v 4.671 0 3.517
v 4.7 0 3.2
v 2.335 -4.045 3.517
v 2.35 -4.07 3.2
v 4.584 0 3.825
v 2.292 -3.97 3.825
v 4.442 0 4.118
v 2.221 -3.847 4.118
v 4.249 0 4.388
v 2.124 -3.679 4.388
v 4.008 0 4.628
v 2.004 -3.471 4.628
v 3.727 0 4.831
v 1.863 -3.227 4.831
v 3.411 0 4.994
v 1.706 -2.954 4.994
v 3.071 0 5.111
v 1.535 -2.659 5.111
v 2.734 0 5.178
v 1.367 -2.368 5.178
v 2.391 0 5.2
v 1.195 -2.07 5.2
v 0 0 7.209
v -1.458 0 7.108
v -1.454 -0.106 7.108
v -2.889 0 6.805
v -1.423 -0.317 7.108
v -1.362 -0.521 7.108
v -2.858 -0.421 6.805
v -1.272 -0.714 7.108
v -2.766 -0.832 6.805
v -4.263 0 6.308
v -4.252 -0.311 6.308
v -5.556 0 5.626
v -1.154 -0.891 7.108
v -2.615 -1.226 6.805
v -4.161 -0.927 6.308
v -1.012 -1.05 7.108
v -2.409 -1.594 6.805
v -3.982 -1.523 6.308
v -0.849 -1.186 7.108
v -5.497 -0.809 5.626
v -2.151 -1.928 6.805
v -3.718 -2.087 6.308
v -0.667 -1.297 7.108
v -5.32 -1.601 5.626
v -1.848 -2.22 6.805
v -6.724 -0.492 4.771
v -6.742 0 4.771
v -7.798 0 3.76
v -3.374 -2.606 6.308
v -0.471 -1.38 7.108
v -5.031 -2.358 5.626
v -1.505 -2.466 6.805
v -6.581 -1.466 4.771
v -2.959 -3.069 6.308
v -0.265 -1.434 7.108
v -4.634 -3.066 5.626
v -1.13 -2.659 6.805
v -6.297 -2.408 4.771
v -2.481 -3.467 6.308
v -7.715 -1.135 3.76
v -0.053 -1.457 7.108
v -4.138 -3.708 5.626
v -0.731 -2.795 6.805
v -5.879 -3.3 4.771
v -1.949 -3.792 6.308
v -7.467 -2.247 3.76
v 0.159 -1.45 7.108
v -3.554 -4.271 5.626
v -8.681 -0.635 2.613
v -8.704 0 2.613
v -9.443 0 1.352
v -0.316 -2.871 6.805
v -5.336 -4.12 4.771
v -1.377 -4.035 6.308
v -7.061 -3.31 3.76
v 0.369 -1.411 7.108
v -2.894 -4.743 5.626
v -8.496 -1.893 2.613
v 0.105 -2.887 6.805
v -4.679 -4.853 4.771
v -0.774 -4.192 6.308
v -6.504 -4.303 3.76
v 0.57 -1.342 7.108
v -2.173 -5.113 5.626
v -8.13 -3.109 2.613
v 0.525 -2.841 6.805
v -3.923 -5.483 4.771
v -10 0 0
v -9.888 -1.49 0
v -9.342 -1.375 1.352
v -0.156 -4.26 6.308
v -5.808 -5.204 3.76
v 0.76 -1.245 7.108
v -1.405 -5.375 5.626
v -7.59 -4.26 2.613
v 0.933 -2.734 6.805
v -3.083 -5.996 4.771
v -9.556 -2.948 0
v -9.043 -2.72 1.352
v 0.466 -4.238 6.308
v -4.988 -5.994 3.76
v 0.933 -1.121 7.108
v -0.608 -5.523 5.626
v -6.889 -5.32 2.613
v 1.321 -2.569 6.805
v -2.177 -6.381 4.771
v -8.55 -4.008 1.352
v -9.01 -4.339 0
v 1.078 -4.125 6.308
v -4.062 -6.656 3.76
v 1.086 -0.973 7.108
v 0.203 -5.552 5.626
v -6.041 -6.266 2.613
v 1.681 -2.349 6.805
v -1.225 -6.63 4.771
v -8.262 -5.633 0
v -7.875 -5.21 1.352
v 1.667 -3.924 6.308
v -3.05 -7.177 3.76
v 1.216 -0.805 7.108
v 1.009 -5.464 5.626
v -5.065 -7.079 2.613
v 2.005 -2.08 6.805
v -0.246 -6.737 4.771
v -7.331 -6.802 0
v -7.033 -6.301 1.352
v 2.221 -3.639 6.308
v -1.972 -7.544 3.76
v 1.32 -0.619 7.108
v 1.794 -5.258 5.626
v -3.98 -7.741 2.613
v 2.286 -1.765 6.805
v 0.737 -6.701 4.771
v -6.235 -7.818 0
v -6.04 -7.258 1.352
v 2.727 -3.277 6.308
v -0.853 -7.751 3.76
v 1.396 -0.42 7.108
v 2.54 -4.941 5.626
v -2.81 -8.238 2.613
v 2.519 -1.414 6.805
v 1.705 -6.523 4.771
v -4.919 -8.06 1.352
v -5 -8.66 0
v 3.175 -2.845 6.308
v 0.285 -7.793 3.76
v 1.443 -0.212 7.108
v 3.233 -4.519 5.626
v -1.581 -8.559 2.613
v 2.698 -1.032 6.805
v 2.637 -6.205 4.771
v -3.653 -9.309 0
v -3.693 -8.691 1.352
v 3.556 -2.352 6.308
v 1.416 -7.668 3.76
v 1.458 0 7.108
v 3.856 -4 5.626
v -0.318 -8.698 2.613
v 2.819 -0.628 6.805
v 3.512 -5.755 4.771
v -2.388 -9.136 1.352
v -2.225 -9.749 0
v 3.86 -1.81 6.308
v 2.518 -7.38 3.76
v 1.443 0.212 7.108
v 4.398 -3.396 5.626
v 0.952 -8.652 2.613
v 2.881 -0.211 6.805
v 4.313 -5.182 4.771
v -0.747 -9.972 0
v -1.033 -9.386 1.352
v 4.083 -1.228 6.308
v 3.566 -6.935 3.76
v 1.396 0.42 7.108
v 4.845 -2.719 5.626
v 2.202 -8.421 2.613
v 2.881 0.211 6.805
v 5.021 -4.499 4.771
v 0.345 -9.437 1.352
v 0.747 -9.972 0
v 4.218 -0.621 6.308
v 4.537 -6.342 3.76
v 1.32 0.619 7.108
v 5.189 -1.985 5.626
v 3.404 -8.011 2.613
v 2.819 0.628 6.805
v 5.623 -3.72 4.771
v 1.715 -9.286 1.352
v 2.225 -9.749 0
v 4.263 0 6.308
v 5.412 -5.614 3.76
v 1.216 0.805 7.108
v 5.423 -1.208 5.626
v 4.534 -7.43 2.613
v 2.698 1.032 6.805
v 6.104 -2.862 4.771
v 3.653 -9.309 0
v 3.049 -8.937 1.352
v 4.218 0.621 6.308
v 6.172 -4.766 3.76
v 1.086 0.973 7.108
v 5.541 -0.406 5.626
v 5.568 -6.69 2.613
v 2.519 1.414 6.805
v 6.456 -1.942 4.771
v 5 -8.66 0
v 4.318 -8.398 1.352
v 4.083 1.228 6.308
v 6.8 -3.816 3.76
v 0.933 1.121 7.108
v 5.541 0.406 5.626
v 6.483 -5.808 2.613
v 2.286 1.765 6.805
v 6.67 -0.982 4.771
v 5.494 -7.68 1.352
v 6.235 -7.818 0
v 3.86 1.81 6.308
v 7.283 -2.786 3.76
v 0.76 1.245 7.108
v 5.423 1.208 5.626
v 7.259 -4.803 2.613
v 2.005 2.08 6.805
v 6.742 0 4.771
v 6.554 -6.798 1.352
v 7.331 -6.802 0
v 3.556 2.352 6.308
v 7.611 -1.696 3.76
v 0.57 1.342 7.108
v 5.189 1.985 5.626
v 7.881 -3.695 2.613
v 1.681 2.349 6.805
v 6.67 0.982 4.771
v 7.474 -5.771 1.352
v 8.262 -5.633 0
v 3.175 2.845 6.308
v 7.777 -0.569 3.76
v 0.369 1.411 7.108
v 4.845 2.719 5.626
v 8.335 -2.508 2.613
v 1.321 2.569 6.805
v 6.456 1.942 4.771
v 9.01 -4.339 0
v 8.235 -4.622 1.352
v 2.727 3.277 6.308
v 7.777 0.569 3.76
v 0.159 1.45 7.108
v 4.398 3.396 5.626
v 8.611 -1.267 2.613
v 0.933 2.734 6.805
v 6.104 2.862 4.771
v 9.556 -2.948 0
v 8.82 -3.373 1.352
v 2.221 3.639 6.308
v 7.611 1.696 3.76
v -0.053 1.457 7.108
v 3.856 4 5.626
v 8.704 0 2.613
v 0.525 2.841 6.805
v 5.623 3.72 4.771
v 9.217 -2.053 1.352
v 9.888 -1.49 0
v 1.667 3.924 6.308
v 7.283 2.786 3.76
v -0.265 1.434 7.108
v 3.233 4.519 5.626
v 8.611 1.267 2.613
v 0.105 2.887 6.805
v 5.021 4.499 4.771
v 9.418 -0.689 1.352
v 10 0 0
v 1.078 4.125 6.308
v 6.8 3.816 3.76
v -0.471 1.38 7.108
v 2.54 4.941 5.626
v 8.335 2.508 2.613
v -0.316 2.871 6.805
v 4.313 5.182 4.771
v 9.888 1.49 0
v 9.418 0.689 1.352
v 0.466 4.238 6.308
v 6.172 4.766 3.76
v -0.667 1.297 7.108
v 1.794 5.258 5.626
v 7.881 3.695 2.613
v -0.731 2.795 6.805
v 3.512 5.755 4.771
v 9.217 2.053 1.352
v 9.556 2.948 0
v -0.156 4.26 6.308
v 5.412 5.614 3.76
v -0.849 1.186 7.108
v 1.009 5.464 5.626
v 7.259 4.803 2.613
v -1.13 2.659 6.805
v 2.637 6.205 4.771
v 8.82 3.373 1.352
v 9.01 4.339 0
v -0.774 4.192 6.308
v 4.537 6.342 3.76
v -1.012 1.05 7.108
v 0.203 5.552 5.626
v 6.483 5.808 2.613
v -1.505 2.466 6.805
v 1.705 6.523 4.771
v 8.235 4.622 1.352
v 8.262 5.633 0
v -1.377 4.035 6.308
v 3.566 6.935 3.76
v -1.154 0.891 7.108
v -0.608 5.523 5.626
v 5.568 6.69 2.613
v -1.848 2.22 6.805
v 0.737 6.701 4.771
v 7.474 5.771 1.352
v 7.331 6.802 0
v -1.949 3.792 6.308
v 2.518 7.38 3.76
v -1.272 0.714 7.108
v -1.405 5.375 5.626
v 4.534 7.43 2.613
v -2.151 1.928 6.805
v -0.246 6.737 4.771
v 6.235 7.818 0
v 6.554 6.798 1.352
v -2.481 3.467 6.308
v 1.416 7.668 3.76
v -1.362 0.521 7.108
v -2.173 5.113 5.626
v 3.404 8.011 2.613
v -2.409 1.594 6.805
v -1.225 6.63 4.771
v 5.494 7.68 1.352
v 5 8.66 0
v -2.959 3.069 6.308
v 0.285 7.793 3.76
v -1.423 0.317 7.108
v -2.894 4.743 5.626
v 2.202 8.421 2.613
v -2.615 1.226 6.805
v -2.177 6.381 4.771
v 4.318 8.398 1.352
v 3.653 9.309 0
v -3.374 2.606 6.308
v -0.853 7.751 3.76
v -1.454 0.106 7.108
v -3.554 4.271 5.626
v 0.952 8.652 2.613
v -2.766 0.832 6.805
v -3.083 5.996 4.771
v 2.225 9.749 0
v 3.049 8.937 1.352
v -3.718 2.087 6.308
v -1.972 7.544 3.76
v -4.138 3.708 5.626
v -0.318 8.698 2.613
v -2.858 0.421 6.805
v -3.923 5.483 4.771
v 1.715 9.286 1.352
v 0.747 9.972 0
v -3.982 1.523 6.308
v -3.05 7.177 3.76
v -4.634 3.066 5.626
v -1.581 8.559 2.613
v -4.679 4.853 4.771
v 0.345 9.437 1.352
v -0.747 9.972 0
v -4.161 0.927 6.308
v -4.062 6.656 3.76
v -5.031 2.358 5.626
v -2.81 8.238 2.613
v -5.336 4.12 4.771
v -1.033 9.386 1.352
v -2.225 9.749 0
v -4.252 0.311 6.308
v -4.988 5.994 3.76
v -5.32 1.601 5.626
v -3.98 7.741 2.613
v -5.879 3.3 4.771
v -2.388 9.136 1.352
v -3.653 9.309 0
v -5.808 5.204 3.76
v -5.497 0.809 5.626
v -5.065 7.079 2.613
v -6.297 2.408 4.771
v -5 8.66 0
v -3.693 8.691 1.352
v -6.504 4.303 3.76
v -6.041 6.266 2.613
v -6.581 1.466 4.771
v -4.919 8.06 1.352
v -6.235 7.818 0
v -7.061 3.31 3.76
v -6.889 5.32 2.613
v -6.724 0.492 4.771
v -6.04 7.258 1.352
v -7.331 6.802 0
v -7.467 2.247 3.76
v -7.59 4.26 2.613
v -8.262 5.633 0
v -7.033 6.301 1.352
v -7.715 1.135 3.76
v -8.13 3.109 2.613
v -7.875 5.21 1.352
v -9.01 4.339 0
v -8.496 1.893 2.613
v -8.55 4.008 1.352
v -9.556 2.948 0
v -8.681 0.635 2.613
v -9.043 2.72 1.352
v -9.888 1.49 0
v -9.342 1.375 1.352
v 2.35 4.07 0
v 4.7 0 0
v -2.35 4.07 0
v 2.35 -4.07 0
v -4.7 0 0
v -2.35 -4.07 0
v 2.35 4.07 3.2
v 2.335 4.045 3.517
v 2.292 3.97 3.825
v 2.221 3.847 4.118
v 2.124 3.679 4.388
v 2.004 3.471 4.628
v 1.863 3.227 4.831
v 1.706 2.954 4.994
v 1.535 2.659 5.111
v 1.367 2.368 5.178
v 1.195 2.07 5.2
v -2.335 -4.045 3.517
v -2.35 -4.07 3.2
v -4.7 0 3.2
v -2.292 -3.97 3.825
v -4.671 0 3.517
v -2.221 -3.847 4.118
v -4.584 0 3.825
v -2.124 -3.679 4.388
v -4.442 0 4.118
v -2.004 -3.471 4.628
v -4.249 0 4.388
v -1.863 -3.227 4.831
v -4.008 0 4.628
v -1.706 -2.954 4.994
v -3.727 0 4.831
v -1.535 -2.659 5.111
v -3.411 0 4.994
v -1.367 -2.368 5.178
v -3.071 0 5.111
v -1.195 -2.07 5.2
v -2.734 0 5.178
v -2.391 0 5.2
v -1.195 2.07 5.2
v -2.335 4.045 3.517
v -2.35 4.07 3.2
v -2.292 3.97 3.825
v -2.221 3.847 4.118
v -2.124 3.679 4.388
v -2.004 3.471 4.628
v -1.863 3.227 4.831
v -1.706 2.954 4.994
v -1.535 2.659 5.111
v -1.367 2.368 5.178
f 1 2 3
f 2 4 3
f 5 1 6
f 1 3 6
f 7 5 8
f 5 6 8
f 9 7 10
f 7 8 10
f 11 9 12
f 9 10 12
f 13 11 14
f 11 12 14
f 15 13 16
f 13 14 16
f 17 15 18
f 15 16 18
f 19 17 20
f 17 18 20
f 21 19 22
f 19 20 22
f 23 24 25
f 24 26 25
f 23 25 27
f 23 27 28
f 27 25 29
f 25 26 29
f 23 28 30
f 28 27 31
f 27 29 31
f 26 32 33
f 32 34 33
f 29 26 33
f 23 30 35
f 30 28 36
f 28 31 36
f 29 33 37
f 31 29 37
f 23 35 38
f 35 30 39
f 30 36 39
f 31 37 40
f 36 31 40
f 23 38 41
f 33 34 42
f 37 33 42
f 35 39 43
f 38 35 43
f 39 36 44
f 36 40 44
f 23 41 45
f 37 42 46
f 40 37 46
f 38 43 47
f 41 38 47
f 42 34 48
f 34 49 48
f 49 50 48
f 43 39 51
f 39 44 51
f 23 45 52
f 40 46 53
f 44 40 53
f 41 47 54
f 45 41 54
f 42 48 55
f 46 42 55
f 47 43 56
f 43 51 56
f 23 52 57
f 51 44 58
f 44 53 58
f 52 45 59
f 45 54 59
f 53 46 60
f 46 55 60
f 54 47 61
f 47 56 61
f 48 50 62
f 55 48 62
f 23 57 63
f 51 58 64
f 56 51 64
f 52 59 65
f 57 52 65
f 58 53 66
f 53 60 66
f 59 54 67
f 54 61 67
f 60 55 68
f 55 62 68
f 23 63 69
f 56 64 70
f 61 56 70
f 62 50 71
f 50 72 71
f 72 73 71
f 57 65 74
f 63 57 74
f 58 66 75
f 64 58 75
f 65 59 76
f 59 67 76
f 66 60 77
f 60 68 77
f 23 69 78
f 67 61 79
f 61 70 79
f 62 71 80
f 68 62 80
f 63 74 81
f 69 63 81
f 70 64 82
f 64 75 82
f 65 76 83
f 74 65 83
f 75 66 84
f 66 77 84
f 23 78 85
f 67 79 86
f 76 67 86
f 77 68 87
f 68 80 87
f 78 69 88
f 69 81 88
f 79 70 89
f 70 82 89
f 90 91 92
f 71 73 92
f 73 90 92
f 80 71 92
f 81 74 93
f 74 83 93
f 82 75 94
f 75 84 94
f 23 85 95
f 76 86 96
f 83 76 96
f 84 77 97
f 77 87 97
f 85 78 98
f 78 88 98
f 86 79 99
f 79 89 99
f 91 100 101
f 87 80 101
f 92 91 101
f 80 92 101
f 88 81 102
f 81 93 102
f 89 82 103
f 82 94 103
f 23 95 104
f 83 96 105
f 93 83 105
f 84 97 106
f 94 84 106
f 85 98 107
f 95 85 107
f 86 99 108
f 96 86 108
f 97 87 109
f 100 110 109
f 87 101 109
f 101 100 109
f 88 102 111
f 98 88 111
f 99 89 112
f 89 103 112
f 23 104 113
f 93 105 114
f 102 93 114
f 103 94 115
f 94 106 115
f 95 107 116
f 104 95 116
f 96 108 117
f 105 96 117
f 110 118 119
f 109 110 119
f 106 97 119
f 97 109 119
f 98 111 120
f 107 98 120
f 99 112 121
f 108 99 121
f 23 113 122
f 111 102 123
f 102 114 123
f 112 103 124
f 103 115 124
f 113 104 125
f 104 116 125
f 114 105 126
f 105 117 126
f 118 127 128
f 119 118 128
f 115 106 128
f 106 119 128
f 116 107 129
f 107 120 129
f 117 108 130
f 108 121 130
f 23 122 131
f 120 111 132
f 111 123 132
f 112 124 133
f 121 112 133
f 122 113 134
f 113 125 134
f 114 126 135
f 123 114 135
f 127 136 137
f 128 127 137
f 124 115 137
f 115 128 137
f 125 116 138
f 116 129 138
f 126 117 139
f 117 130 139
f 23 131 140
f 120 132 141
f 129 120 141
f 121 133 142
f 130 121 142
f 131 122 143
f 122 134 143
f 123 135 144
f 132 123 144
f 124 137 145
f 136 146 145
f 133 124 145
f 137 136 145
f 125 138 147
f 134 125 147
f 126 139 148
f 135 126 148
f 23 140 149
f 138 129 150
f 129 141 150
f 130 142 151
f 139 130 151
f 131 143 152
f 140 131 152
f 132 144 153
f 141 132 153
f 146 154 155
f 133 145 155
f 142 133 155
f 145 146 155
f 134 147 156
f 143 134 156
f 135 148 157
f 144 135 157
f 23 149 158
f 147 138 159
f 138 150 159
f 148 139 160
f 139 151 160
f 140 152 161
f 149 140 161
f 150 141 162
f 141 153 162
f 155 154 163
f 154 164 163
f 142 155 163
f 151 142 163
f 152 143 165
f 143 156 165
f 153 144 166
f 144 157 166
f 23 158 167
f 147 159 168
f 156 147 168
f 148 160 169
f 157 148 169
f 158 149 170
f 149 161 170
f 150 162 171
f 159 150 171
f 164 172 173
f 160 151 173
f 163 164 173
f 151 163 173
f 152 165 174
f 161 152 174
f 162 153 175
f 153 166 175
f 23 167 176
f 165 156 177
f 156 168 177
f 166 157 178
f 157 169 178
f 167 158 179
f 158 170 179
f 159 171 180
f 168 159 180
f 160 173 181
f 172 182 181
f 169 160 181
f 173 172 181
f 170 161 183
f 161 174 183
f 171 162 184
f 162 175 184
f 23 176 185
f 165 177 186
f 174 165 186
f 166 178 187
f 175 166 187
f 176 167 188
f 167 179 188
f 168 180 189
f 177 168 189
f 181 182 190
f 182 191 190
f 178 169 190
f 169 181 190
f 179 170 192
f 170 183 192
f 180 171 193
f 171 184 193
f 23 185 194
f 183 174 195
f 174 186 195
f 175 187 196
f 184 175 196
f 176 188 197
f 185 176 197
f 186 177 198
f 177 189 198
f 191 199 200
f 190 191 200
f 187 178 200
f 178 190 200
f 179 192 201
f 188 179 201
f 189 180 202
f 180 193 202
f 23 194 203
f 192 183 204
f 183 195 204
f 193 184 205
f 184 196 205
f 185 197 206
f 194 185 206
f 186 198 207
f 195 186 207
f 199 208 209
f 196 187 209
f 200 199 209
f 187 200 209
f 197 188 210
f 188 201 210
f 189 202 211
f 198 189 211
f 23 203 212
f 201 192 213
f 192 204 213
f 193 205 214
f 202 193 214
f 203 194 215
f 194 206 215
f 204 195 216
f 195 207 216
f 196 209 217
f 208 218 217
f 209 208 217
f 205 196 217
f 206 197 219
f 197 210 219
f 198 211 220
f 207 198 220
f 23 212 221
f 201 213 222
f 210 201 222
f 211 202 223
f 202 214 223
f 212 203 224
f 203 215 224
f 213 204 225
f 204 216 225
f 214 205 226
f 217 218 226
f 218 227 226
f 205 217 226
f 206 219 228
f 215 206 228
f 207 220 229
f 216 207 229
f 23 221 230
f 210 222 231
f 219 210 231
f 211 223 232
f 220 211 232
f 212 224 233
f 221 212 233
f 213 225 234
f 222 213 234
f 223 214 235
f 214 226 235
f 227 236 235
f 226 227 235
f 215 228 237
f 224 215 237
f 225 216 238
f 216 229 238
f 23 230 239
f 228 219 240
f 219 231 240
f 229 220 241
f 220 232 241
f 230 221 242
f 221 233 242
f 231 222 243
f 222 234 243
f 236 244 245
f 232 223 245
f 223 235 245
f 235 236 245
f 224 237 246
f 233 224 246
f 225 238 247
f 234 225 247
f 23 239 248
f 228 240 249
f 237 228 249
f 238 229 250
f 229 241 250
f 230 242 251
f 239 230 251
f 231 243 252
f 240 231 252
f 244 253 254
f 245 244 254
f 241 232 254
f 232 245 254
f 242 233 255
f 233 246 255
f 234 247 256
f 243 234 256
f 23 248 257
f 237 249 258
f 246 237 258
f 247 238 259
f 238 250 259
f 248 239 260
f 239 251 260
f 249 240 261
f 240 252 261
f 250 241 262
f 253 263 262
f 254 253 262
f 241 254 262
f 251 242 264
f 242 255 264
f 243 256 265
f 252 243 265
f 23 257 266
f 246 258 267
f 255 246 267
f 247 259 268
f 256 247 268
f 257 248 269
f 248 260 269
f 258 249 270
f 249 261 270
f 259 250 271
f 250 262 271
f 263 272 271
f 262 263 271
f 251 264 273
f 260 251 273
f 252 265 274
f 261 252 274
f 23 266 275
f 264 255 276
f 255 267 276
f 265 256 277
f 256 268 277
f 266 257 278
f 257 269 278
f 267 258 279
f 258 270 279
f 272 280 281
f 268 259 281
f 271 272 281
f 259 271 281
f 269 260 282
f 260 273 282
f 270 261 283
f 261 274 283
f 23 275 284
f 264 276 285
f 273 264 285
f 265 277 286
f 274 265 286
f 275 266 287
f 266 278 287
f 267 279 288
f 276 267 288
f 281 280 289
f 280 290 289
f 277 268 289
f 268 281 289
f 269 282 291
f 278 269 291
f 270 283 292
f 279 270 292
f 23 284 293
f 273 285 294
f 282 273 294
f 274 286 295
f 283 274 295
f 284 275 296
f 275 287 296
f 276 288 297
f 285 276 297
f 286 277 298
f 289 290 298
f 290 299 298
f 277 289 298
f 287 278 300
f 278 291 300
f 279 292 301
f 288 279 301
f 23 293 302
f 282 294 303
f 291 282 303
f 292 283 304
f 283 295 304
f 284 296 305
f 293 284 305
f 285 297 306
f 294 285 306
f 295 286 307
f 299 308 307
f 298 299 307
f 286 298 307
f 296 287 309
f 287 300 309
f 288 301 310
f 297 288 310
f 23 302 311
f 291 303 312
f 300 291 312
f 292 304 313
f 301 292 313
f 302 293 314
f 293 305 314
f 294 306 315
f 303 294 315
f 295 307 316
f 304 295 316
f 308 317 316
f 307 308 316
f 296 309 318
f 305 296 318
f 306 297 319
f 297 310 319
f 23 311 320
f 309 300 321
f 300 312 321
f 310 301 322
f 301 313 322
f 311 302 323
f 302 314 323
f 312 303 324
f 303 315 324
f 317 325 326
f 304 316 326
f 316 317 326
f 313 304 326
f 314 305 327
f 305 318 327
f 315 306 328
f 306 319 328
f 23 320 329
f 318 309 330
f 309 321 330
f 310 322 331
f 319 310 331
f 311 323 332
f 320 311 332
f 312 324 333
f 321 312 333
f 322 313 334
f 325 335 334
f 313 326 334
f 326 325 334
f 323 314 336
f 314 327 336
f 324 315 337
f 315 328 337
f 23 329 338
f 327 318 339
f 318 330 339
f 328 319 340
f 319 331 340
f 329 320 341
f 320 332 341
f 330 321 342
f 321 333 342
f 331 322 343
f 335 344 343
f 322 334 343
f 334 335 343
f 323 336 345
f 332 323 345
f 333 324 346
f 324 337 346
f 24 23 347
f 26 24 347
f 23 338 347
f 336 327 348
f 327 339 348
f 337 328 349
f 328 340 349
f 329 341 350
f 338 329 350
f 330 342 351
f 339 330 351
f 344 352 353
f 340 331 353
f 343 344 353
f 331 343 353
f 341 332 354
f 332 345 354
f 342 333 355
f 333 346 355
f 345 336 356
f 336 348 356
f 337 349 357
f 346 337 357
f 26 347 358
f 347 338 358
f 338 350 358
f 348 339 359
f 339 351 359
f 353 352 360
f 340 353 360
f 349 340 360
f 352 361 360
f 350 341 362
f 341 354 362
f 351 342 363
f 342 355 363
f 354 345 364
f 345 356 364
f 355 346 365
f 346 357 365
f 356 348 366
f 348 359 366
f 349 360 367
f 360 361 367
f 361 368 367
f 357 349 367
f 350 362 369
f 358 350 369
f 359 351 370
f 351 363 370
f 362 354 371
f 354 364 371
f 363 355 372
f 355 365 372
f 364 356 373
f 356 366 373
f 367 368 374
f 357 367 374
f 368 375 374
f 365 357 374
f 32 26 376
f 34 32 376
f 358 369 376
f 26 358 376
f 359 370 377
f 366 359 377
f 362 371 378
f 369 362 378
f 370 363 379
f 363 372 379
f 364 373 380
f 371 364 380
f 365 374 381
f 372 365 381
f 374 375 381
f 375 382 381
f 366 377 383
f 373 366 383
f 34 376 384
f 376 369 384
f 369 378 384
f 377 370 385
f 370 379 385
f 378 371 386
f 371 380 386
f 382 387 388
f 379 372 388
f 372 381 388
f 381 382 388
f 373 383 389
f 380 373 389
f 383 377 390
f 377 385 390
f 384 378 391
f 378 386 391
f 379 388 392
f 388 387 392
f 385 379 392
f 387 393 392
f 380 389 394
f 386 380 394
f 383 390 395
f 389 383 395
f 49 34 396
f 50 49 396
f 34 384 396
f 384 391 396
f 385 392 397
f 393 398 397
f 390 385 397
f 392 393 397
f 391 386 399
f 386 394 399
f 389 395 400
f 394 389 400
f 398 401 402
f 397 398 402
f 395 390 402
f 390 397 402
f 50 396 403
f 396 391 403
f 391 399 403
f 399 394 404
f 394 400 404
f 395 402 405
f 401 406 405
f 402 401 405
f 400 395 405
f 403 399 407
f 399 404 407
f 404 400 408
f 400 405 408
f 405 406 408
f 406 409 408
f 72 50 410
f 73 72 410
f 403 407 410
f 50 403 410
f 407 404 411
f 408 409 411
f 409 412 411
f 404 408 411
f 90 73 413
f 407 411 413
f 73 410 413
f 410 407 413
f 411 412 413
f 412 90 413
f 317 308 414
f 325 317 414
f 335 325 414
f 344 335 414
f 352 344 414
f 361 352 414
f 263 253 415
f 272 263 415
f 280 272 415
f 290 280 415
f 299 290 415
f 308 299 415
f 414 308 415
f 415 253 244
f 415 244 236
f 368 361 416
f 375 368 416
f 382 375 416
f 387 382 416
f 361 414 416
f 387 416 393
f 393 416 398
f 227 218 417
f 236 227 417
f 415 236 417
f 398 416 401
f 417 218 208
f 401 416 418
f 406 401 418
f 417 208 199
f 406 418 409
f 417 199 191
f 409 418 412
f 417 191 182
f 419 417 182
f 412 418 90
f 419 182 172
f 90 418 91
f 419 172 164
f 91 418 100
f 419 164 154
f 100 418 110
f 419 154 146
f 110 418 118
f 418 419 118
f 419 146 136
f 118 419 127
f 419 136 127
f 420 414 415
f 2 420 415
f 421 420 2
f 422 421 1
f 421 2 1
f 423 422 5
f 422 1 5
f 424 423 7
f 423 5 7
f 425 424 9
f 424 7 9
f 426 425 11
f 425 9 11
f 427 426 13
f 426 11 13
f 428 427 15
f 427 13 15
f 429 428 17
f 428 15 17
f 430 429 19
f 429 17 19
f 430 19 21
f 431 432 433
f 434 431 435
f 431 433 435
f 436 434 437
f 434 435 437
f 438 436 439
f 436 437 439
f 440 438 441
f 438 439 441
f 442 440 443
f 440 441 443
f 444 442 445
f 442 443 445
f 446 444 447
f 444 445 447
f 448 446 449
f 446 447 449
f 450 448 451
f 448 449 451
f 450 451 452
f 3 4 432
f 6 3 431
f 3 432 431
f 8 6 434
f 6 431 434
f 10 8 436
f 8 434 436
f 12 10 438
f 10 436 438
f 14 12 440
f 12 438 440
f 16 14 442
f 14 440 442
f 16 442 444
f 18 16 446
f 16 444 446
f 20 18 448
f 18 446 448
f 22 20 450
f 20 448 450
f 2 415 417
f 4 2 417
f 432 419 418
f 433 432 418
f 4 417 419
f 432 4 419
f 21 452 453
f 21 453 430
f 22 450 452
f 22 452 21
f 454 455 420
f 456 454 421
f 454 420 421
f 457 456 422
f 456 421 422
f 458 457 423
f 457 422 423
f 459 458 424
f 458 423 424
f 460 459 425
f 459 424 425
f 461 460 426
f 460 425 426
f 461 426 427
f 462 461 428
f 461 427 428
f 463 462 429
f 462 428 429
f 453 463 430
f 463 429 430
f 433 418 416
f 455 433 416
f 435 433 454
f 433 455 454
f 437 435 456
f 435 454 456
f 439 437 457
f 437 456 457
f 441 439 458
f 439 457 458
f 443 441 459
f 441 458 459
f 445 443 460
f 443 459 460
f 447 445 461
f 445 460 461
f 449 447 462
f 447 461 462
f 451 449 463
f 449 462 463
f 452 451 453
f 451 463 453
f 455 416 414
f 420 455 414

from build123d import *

# Parameters (mm, degrees)
F4_DEPTH = 5.2
F5_R     = 2


with BuildPart() as f2:
    # F1 (on Front) → F2 (revolve)
    with BuildSketch(Plane.XZ):
        with BuildLine():
            ThreePointArc((0, 7.2088790199), (-6.1637637999, 5.2187873117), (-10, 0))
            Line((-10, 0), (0, 0))
            Line((0, 0), (0, 7.2088790199))
        make_face()
    revolve(axis=Axis((0, 0, 3.60443951), (0, 0, 1)))

    # F3 (on face) → F4 (cut)
    with BuildSketch(Plane(origin=(0, 0, 0), x_dir=(1, 0, 0), z_dir=(0, 0, -1))):
        Polygon((2.35, 4.0703193978), (-2.35, 4.0703193978), (-4.7, 0), (-2.35, -4.0703193978), (2.35, -4.0703193978), (4.7, 0), align=None)
    extrude(amount=-F4_DEPTH, mode=Mode.SUBTRACT)

    # F5
    f5_edges = [f2.edges().sort_by_distance(p)[0] for p in [
        (0, -4.070319, 5.2),
        (-3.525, -2.03516, 5.2),
        (3.525, -2.03516, 5.2),
        (3.525, 2.03516, 5.2),
        (-3.525, 2.03516, 5.2),
        (0, 4.070319, 5.2),
    ]]
    fillet(f5_edges, radius=F5_R)


solid = f2.part
